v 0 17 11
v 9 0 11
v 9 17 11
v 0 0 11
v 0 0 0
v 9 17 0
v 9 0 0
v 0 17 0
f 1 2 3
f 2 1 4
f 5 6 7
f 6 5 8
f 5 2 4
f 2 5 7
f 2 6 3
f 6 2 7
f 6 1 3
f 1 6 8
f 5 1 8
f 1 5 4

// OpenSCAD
// Generated by SolidPython 1.0.1 on 2020-07-29 00:46:55


cube(size = [9, 17, 11]);
/***********************************************
*********      SolidPython code:      **********
************************************************
 
# import packages: SolidPython
from solid import *
from solid.utils import *
from itertools import chain, combinations, permutations


class Resize:

    def __init__(self, scad_file):
        self.scad_file = scad_file
        #self.scad_file = import_scad(scad_file)
        # cone/cylinder param:
        self.r1 = 0
        self.r2 = 0
        self.h = 0
        # rectangular prism param:
        self.w = 0
        self.l = 0
        # ellipse param:
        self.r = 0

    # import OpenScad code (file name corresponds to shape)


    # classify shape + parameters
    def assign(self, param1, param2, param3):
        if self.scad_file == 'cone.scad':
            self.r1 = param1
            self.r2 = param2
            self.h = param3
        elif self.scad_file == 'cylinder.scad':
            self.r1 = param1
            self.r2 = param2
            self.h = param3
        elif self.scad_file == 'rectangularPrism.scad':
            self.h = param1
            self.l = param2
            self.w = param3
        else:
            self.r = param1
            self.h = param2

    # resize parameters
    def iterate(self):
        x = range(3, 20, 2)
        i = 1
        if self.scad_file == 'cone.scad':
            tempList = list(permutations(x, 2))
            for temp in tempList:
                param1 = temp[0]
                param2 = temp[1]
                filepath = 'produced_scad_files/' + 'cone' + str(param1) + '_' + str(param2) + '_' + '.scad'
                scad_render_to_file(cylinder(h=param1, r1=param2, r2=0), filepath)

        elif self.scad_file == 'cylinder.scad':
            tempList = list(permutations(x, 3))
            for temp in tempList:
                param1 = temp[0]
                param2 = temp[1]
                filepath = 'produced_scad_files/' + 'cylinder' + str(param1) + '_' + str(param2) + '_' + '.scad'
                scad_render_to_file(cylinder(h=param1, r1=param2, r2=param2), filepath)

        elif self.scad_file == 'rectangularPrism.scad':
            tempList = list(permutations(x, 3))
            for temp in tempList:
                param1 = temp[0]
                param2 = temp[1]
                param3 = temp[2]
                filepath = 'produced_scad_files/' + 'rectangularPrism' + str(param1) + '_' + str(param2) + '_' + str(
                    param3) + '.scad'
                scad_render_to_file(cube(size=(param1, param2, param3)), filepath)

        elif self.scad_file == 'ellipse.scad':
            tempList = list(permutations(x, 4))
            for temp in tempList:
                param1 = temp[0]
                param2 = temp[1]
                param3 = temp[2]
                param4 = temp[3]
                filepath = 'produced_scad_files/' + 'ellipse' + str(param1) + '_' + str(param2) + '_' + str(param3) + '_' + str(param4) + '.scad'
                scad_render_to_file(scale([param1, param2, param3])(sphere(r=param4)), filepath)

    def render_to_scadfile(self):
        scad_render_to_file(scad, 'example.scad') 
 
************************************************/
